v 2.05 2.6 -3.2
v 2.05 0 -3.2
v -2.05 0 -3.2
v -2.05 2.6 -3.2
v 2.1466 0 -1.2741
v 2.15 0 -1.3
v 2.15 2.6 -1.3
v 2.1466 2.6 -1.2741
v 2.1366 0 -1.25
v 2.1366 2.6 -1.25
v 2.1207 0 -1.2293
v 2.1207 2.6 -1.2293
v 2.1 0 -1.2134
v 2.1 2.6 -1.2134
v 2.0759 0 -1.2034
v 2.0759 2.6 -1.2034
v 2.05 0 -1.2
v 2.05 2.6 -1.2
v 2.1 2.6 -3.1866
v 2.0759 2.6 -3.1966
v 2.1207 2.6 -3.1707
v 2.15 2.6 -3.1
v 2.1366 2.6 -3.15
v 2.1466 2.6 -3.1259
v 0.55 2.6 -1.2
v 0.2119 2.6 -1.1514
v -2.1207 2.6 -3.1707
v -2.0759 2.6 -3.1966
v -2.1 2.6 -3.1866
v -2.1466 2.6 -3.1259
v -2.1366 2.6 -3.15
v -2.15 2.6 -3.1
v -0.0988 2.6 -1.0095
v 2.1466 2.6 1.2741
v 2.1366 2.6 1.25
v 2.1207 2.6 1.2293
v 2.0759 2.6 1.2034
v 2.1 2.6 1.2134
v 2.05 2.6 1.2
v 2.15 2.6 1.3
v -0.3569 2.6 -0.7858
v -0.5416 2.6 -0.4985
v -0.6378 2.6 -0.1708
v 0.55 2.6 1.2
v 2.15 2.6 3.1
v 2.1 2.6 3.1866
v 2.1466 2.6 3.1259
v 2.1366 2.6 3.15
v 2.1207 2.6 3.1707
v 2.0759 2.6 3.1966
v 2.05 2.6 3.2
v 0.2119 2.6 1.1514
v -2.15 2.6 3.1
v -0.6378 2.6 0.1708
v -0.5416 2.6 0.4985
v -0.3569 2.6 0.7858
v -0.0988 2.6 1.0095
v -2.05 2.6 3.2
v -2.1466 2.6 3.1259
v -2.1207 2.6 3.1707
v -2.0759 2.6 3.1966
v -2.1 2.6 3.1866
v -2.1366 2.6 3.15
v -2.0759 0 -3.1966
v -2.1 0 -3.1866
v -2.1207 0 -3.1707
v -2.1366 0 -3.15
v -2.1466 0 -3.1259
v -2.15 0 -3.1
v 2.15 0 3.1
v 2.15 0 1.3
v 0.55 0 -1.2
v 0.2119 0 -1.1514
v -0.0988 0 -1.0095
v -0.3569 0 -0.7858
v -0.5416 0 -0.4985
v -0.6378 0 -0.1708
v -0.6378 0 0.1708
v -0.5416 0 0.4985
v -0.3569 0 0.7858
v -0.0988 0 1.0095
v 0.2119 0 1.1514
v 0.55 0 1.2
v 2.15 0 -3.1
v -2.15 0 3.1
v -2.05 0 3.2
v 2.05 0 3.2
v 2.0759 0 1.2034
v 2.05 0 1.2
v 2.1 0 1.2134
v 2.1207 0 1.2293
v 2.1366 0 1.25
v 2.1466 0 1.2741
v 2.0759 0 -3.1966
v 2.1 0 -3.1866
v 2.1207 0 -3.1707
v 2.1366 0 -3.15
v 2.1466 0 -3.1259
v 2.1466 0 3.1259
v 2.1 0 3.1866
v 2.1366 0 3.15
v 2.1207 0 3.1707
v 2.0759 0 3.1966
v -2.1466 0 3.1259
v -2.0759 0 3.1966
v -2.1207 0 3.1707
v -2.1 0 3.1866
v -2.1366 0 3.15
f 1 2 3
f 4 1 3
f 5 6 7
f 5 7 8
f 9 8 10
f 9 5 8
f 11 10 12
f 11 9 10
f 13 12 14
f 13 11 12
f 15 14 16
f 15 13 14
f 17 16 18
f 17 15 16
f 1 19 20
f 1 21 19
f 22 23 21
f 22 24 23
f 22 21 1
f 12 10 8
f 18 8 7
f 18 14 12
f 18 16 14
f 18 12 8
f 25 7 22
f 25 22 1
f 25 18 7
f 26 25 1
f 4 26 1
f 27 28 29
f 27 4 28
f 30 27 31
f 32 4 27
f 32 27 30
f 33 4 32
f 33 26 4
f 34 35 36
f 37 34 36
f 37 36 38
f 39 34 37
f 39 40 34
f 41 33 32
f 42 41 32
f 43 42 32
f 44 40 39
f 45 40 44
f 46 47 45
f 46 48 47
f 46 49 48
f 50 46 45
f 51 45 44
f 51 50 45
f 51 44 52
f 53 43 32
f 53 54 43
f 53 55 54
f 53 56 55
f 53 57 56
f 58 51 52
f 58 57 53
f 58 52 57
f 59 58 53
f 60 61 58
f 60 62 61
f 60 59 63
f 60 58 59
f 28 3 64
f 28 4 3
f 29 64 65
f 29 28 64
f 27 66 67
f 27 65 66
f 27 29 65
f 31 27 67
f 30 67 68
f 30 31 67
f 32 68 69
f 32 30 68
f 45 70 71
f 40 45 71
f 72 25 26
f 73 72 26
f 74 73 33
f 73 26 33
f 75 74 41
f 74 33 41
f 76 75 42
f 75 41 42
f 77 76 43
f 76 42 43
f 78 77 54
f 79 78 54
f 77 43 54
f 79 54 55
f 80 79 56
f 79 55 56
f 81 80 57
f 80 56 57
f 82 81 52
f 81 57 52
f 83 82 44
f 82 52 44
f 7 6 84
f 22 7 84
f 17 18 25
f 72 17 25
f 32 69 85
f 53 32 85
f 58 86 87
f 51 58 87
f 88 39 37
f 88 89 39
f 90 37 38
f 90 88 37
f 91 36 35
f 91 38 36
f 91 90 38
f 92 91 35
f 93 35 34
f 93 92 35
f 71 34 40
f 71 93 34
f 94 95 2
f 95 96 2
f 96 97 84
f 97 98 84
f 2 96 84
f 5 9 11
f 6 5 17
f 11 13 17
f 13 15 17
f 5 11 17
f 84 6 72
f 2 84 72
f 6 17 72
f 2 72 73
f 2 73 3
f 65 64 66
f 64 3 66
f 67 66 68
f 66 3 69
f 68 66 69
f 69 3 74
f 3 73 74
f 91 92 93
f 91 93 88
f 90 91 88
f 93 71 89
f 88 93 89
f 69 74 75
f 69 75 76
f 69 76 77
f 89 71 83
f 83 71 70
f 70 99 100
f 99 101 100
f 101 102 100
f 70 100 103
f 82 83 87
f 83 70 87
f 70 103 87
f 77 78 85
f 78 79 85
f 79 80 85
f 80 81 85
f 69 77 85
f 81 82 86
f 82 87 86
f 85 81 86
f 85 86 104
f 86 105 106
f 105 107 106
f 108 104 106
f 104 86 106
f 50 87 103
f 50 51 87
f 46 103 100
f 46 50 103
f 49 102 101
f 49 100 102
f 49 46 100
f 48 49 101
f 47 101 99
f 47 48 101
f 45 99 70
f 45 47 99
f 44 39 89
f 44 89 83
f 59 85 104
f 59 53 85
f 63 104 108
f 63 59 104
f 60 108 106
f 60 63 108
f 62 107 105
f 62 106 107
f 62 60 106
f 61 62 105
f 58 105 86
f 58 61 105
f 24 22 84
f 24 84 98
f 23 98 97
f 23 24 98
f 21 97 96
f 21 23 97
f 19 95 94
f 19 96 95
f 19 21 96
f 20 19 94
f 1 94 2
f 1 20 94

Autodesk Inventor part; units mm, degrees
ref_plane "YZ Plane" through (0, 0, 0) normal (1, 0, 0) x (0, 1, 0)
ref_plane "XZ Plane" through (0, 0, 0) normal (0, 1, 0) x (-1, 0, 0)
ref_plane "XY Plane" through (0, 0, 0) normal (0, 0, 1) x (1, 0, 0)
sketch "Sketch1" plane through (0, 0, 0) normal (0, 1, 0) x (-1, 0, 0)
  line L0 (-2.15, -3.2) -> (2.15, -3.2)
  line L1 (2.15, -3.2) -> (2.15, 3.2)
  line L2 (2.15, 3.2) -> (-2.15, 3.2)
  line L3 (-2.15, 3.2) -> (-2.15, -3.2)
  line L4 (-2.15, -3.2) -> (2.15, 3.2) construction
  line L5 (2.15, -3.2) -> (-2.15, 3.2) construction
  point P0 (0, 0)
  dimension "d0" = 6.4
  dimension "d1" = 4.3
extrude "Extrusion1" add sketch "Sketch1" along normal blind 2.6
sketch "Sketch2" plane through (0, 2.6, 0) normal (0, 1, 0) x (1, 0, 0)
  line L0 (2.15, -3.2) -> (2.15, 3.2) projected
  line L1 (2.15, -1.2) -> (0.55, -1.2)
  line L2 (2.15, 1.2) -> (0.55, 1.2)
  arc A0 (0.55, 1.2) -> (0.55, -1.2) centre (0.55, 0) ccw
  point P0 (0, 0)
  dimension "d4" = 2.4
  dimension "d5" = 1.2
  dimension "d6" = 1.6
  dimension "d7" = 1.2
extrude "Extrusion2" cut sketch "Sketch2" against normal through all
fillet "Fillet1" radius 0.1 6 edges at (2.15, 1.3, 3.2) (-2.15, 1.3, 3.2) (-2.15, 1.3, -3.2) (2.15, 1.3, -3.2) (2.15, 1.3, -1.2) (2.15, 1.3, 1.2)
equation "\"d5\" = 0.5 * d4"
properties part number "Edge Spacer v2p0"
